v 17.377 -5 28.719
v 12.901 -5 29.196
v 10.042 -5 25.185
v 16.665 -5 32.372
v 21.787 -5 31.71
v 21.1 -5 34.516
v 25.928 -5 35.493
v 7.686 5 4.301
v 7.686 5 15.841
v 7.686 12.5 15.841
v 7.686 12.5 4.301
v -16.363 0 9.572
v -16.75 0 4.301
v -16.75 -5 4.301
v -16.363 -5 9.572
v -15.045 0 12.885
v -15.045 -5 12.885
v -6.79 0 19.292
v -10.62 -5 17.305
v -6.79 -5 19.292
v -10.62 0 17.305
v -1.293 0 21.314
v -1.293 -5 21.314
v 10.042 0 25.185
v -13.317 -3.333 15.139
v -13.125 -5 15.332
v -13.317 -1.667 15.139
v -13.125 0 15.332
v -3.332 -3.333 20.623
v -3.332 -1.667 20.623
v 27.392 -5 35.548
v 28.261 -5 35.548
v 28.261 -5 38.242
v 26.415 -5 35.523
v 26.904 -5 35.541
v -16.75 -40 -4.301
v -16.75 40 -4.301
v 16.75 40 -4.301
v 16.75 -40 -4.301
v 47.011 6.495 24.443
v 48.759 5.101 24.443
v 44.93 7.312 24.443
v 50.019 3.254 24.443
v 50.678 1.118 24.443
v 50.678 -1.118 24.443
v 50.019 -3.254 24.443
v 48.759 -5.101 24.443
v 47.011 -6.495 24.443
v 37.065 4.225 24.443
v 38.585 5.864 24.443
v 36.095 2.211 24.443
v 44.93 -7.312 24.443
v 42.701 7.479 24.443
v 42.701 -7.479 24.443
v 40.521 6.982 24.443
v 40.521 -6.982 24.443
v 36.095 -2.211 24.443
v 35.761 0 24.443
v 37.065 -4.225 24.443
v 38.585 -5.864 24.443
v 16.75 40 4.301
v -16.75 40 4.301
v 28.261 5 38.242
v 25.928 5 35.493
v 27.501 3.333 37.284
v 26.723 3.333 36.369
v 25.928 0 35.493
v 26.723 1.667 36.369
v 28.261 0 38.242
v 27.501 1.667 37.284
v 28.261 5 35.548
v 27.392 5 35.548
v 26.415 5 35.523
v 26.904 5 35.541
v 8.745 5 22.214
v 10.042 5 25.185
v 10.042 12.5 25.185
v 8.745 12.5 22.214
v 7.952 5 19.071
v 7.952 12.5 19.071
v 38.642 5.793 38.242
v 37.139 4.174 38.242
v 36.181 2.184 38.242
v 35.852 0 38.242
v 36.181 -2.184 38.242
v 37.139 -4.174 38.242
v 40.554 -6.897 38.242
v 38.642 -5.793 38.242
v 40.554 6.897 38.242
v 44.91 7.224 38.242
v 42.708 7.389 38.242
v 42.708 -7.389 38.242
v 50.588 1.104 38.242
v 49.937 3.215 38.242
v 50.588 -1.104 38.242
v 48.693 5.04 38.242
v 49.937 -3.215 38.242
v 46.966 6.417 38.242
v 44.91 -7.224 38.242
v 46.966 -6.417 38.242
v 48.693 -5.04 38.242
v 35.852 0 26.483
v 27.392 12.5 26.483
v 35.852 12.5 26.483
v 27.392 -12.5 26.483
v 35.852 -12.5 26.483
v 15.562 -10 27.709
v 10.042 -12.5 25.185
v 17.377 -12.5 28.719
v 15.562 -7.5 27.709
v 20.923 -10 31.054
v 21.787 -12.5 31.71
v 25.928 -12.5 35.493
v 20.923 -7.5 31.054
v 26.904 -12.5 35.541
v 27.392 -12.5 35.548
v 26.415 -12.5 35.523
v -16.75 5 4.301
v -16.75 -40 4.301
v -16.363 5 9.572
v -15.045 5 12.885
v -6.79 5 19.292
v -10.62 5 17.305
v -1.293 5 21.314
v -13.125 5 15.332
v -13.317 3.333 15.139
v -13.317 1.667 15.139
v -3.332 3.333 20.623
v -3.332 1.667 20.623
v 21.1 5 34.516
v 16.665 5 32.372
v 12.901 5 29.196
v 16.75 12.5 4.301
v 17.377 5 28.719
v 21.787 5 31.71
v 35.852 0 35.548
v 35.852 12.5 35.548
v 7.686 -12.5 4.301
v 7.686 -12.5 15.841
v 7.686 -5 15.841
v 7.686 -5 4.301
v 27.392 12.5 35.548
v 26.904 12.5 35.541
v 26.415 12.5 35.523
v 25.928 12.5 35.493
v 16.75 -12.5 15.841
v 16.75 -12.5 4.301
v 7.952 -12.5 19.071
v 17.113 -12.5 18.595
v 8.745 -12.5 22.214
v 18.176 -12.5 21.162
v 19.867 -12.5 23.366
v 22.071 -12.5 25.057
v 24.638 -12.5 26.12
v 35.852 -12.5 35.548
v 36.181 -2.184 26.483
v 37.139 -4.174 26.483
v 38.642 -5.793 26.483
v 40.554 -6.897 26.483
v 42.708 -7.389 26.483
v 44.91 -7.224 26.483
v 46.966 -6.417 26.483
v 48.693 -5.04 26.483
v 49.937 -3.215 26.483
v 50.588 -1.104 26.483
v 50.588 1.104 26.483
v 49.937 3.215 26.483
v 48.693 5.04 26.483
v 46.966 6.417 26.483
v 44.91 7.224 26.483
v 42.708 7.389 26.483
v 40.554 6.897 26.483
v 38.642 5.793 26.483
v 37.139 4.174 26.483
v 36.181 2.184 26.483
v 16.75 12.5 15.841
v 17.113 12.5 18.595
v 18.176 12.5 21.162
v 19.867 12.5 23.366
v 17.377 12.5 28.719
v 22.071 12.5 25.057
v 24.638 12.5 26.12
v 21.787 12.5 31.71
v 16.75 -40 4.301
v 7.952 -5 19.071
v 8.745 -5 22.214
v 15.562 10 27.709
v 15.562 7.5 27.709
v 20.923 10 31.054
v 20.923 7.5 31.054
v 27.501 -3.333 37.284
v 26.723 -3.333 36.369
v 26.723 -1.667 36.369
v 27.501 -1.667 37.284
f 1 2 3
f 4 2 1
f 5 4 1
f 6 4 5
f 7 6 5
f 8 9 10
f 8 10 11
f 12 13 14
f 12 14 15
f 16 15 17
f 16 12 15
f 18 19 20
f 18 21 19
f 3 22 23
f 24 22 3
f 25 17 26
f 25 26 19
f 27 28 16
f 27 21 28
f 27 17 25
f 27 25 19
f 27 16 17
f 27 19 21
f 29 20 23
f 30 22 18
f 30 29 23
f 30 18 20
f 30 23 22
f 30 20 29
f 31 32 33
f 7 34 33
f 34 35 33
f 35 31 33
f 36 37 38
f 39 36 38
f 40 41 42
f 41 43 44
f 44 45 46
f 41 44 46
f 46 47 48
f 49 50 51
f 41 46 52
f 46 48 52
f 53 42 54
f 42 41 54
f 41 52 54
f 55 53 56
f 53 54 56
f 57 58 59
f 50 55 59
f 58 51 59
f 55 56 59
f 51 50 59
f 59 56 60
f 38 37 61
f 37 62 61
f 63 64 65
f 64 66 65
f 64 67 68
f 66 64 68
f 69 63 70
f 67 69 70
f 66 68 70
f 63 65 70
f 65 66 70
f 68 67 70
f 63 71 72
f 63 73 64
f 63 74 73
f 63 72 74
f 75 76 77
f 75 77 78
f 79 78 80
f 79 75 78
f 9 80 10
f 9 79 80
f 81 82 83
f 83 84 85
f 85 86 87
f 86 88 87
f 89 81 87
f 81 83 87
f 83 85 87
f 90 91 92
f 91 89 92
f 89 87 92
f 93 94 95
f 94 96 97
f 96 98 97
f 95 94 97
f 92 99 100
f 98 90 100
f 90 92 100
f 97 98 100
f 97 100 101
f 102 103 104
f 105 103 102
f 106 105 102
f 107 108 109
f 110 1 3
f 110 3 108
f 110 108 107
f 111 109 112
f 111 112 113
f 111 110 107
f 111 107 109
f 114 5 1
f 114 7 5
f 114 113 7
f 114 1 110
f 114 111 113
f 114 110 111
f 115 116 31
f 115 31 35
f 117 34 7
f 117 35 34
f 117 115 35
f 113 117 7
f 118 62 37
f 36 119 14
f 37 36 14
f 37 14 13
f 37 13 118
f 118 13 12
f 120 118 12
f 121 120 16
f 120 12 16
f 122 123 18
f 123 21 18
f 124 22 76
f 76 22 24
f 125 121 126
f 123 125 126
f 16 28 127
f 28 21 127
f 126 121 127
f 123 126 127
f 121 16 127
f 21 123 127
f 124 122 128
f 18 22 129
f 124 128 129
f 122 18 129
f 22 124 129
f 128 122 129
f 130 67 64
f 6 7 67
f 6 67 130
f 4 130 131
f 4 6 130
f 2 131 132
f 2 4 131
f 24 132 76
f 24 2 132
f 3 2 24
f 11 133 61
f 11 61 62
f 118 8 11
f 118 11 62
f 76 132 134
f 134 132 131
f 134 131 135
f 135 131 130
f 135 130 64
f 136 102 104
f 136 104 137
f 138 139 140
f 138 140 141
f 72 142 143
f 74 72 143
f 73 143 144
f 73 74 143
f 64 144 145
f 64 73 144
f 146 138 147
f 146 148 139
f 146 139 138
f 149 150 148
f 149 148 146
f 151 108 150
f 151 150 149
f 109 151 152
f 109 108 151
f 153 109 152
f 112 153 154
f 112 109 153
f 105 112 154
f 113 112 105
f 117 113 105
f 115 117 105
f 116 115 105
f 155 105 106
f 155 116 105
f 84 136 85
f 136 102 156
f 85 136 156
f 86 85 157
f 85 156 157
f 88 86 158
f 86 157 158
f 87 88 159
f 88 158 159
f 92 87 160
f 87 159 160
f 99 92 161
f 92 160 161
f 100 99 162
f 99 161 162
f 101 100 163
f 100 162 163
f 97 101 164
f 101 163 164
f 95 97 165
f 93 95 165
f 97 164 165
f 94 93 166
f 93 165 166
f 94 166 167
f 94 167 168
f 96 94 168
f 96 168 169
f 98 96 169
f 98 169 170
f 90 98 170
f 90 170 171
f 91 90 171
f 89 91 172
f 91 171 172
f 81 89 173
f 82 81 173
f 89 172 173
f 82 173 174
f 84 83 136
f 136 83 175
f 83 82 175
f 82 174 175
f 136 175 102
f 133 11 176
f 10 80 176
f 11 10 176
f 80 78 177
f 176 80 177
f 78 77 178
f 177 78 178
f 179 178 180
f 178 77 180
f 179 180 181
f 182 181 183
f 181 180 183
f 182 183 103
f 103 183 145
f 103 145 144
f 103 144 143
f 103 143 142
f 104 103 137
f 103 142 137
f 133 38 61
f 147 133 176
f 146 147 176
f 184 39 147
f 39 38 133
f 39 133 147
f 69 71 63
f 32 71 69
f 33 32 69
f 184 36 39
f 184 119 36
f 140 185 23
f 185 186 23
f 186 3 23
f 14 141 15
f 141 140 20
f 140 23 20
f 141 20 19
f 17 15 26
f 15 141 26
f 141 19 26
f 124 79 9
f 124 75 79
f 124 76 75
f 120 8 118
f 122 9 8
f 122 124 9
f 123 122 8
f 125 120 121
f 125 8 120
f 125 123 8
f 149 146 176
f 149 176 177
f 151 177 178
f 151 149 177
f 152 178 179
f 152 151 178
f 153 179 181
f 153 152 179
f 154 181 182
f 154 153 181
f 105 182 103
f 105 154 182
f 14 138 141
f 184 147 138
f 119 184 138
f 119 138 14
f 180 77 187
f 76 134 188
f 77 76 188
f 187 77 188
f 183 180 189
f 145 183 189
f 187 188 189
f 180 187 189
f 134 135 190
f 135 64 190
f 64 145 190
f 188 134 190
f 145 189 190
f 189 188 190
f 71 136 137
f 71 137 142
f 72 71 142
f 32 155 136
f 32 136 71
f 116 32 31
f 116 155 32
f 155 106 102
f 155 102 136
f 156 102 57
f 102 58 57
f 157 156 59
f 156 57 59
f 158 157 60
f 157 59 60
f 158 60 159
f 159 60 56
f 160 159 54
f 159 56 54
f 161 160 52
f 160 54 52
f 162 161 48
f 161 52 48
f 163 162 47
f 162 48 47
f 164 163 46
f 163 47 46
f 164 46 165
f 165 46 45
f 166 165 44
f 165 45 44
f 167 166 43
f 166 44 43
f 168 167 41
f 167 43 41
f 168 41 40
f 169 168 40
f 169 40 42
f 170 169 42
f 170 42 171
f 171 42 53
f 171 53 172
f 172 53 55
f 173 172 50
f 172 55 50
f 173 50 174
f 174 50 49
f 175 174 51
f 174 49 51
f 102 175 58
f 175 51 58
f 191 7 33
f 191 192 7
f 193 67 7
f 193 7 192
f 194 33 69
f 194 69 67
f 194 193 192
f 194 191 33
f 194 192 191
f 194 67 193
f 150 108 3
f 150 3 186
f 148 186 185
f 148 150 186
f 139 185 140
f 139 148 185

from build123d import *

# Parameters (mm, degrees)
F0_W     = 7.5905228982
F0_H     = 9.0643905006
F1_DEPTH = 12.5
F2_DEPTH = 40
F4_DEPTH = 5


with BuildPart() as f1:
    # F0 (on Front) → F1 (new body, symmetric)
    with BuildSketch(Plane.XZ):
        with BuildLine():
            Line((7.6856094994, 4.3011470738), (16.75, 4.3011470738))
            Line((16.75, 4.3011470738), (16.75, 15.840813565))
            ThreePointArc((16.75, 15.840813565), (19.8670563253, 23.3660532203), (27.3922959806, 26.4831095456))
            Line((27.3922959806, 26.4831095456), (28.2613855783, 26.4831095456))
            Line((28.2613855783, 26.4831095456), (28.2613855783, 35.5475000462))
            Line((28.2613855783, 35.5475000462), (27.3922959806, 35.5475000462))
            ThreePointArc((27.3922959806, 35.5475000462), (26.6595058125, 35.5338709873), (25.9277292333, 35.4930026622))
            add(Edge.make_bspline(
                [(10.0418291586, 25.185052064), (15.5775151902, 27.3891576343), (21.1654840675, 30.4152159291), (25.9277292333, 35.4930026622)],
                knots=[38.5685549277, 38.5685549277, 38.5685549277, 38.5685549277, 53.8052003725, 53.8052003725, 53.8052003725, 53.8052003725], degree=3))
            ThreePointArc((10.0418291586, 25.185052064), (8.283741587, 20.659178542), (7.6856094994, 15.840813565))
            Line((7.6856094994, 15.840813565), (7.6856094994, 4.3011470738))
        make_face()
        with Locations((32.0566470274, 31.0153047959)):
            Rectangle(F0_W, F0_H)
    extrude(amount=F1_DEPTH, both=True)

    # F0 (on Front) → F2 (join, symmetric)
    with BuildSketch(Plane.XZ):
        Polygon((-16.75, -4.3011470738), (16.75, -4.3011470738), (16.75, 4.3011470738), (7.6856094994, 4.3011470738), (-16.75, 4.3011470738), align=None)
    extrude(amount=F2_DEPTH, both=True)

    # F0 (on Front) → F3 (revolve)
    with BuildSketch(Plane.XZ):
        Polygon((35.8519084766, 35.5475000462), (35.8519084766, 26.4831095456), (35.7613855783, 24.4431112285), (43.2613855783, 24.4431112285), (43.2613855783, 38.2416049142), (35.8519084766, 38.2416049142), align=None)
    revolve(axis=Axis((43.2613855783, 0, 31.3423580713), (0, 0, 1)))

    # F0 (on Front) → F4 (join, symmetric)
    with BuildSketch(Plane.XZ):
        with BuildLine():
            add(Edge.make_bspline(
                [(-16.75, 4.3011470738), (-17.6481580104, 19.2931920358), (-3.9706653598, 19.6057946701), (10.0418291586, 25.185052064)],
                knots=[0, 0, 0, 0, 38.5685549277, 38.5685549277, 38.5685549277, 38.5685549277], degree=3))
            Line((-16.75, 4.3011470738), (7.6856094994, 4.3011470738))
            Line((7.6856094994, 4.3011470738), (7.6856094994, 15.840813565))
            ThreePointArc((7.6856094994, 15.840813565), (8.283741587, 20.659178542), (10.0418291586, 25.185052064))
        make_face()
        with BuildLine():
            ThreePointArc((25.9277292333, 35.4930026622), (16.6654682372, 32.3722581065), (10.0418291586, 25.185052064))
            add(Edge.make_bspline(
                [(10.0418291586, 25.185052064), (15.5775151902, 27.3891576343), (21.1654840675, 30.4152159291), (25.9277292333, 35.4930026622)],
                knots=[38.5685549277, 38.5685549277, 38.5685549277, 38.5685549277, 53.8052003725, 53.8052003725, 53.8052003725, 53.8052003725], degree=3))
        make_face()
        with BuildLine():
            add(Edge.make_bspline(
                [(25.9277292333, 35.4930026622), (26.7304788127, 36.34894162), (27.5097660464, 37.2631789667), (28.2613855783, 38.2416049142)],
                knots=[53.8052003725, 53.8052003725, 53.8052003725, 53.8052003725, 56.3735710248, 56.3735710248, 56.3735710248, 56.3735710248], degree=3))
            ThreePointArc((25.9277292333, 35.4930026622), (26.6595058125, 35.5338709873), (27.3922959806, 35.5475000462))
            Line((27.3922959806, 35.5475000462), (28.2613855783, 35.5475000462))
            Line((28.2613855783, 35.5475000462), (28.2613855783, 38.2416049142))
        make_face()
    extrude(amount=F4_DEPTH, both=True)


solid = f1.part
